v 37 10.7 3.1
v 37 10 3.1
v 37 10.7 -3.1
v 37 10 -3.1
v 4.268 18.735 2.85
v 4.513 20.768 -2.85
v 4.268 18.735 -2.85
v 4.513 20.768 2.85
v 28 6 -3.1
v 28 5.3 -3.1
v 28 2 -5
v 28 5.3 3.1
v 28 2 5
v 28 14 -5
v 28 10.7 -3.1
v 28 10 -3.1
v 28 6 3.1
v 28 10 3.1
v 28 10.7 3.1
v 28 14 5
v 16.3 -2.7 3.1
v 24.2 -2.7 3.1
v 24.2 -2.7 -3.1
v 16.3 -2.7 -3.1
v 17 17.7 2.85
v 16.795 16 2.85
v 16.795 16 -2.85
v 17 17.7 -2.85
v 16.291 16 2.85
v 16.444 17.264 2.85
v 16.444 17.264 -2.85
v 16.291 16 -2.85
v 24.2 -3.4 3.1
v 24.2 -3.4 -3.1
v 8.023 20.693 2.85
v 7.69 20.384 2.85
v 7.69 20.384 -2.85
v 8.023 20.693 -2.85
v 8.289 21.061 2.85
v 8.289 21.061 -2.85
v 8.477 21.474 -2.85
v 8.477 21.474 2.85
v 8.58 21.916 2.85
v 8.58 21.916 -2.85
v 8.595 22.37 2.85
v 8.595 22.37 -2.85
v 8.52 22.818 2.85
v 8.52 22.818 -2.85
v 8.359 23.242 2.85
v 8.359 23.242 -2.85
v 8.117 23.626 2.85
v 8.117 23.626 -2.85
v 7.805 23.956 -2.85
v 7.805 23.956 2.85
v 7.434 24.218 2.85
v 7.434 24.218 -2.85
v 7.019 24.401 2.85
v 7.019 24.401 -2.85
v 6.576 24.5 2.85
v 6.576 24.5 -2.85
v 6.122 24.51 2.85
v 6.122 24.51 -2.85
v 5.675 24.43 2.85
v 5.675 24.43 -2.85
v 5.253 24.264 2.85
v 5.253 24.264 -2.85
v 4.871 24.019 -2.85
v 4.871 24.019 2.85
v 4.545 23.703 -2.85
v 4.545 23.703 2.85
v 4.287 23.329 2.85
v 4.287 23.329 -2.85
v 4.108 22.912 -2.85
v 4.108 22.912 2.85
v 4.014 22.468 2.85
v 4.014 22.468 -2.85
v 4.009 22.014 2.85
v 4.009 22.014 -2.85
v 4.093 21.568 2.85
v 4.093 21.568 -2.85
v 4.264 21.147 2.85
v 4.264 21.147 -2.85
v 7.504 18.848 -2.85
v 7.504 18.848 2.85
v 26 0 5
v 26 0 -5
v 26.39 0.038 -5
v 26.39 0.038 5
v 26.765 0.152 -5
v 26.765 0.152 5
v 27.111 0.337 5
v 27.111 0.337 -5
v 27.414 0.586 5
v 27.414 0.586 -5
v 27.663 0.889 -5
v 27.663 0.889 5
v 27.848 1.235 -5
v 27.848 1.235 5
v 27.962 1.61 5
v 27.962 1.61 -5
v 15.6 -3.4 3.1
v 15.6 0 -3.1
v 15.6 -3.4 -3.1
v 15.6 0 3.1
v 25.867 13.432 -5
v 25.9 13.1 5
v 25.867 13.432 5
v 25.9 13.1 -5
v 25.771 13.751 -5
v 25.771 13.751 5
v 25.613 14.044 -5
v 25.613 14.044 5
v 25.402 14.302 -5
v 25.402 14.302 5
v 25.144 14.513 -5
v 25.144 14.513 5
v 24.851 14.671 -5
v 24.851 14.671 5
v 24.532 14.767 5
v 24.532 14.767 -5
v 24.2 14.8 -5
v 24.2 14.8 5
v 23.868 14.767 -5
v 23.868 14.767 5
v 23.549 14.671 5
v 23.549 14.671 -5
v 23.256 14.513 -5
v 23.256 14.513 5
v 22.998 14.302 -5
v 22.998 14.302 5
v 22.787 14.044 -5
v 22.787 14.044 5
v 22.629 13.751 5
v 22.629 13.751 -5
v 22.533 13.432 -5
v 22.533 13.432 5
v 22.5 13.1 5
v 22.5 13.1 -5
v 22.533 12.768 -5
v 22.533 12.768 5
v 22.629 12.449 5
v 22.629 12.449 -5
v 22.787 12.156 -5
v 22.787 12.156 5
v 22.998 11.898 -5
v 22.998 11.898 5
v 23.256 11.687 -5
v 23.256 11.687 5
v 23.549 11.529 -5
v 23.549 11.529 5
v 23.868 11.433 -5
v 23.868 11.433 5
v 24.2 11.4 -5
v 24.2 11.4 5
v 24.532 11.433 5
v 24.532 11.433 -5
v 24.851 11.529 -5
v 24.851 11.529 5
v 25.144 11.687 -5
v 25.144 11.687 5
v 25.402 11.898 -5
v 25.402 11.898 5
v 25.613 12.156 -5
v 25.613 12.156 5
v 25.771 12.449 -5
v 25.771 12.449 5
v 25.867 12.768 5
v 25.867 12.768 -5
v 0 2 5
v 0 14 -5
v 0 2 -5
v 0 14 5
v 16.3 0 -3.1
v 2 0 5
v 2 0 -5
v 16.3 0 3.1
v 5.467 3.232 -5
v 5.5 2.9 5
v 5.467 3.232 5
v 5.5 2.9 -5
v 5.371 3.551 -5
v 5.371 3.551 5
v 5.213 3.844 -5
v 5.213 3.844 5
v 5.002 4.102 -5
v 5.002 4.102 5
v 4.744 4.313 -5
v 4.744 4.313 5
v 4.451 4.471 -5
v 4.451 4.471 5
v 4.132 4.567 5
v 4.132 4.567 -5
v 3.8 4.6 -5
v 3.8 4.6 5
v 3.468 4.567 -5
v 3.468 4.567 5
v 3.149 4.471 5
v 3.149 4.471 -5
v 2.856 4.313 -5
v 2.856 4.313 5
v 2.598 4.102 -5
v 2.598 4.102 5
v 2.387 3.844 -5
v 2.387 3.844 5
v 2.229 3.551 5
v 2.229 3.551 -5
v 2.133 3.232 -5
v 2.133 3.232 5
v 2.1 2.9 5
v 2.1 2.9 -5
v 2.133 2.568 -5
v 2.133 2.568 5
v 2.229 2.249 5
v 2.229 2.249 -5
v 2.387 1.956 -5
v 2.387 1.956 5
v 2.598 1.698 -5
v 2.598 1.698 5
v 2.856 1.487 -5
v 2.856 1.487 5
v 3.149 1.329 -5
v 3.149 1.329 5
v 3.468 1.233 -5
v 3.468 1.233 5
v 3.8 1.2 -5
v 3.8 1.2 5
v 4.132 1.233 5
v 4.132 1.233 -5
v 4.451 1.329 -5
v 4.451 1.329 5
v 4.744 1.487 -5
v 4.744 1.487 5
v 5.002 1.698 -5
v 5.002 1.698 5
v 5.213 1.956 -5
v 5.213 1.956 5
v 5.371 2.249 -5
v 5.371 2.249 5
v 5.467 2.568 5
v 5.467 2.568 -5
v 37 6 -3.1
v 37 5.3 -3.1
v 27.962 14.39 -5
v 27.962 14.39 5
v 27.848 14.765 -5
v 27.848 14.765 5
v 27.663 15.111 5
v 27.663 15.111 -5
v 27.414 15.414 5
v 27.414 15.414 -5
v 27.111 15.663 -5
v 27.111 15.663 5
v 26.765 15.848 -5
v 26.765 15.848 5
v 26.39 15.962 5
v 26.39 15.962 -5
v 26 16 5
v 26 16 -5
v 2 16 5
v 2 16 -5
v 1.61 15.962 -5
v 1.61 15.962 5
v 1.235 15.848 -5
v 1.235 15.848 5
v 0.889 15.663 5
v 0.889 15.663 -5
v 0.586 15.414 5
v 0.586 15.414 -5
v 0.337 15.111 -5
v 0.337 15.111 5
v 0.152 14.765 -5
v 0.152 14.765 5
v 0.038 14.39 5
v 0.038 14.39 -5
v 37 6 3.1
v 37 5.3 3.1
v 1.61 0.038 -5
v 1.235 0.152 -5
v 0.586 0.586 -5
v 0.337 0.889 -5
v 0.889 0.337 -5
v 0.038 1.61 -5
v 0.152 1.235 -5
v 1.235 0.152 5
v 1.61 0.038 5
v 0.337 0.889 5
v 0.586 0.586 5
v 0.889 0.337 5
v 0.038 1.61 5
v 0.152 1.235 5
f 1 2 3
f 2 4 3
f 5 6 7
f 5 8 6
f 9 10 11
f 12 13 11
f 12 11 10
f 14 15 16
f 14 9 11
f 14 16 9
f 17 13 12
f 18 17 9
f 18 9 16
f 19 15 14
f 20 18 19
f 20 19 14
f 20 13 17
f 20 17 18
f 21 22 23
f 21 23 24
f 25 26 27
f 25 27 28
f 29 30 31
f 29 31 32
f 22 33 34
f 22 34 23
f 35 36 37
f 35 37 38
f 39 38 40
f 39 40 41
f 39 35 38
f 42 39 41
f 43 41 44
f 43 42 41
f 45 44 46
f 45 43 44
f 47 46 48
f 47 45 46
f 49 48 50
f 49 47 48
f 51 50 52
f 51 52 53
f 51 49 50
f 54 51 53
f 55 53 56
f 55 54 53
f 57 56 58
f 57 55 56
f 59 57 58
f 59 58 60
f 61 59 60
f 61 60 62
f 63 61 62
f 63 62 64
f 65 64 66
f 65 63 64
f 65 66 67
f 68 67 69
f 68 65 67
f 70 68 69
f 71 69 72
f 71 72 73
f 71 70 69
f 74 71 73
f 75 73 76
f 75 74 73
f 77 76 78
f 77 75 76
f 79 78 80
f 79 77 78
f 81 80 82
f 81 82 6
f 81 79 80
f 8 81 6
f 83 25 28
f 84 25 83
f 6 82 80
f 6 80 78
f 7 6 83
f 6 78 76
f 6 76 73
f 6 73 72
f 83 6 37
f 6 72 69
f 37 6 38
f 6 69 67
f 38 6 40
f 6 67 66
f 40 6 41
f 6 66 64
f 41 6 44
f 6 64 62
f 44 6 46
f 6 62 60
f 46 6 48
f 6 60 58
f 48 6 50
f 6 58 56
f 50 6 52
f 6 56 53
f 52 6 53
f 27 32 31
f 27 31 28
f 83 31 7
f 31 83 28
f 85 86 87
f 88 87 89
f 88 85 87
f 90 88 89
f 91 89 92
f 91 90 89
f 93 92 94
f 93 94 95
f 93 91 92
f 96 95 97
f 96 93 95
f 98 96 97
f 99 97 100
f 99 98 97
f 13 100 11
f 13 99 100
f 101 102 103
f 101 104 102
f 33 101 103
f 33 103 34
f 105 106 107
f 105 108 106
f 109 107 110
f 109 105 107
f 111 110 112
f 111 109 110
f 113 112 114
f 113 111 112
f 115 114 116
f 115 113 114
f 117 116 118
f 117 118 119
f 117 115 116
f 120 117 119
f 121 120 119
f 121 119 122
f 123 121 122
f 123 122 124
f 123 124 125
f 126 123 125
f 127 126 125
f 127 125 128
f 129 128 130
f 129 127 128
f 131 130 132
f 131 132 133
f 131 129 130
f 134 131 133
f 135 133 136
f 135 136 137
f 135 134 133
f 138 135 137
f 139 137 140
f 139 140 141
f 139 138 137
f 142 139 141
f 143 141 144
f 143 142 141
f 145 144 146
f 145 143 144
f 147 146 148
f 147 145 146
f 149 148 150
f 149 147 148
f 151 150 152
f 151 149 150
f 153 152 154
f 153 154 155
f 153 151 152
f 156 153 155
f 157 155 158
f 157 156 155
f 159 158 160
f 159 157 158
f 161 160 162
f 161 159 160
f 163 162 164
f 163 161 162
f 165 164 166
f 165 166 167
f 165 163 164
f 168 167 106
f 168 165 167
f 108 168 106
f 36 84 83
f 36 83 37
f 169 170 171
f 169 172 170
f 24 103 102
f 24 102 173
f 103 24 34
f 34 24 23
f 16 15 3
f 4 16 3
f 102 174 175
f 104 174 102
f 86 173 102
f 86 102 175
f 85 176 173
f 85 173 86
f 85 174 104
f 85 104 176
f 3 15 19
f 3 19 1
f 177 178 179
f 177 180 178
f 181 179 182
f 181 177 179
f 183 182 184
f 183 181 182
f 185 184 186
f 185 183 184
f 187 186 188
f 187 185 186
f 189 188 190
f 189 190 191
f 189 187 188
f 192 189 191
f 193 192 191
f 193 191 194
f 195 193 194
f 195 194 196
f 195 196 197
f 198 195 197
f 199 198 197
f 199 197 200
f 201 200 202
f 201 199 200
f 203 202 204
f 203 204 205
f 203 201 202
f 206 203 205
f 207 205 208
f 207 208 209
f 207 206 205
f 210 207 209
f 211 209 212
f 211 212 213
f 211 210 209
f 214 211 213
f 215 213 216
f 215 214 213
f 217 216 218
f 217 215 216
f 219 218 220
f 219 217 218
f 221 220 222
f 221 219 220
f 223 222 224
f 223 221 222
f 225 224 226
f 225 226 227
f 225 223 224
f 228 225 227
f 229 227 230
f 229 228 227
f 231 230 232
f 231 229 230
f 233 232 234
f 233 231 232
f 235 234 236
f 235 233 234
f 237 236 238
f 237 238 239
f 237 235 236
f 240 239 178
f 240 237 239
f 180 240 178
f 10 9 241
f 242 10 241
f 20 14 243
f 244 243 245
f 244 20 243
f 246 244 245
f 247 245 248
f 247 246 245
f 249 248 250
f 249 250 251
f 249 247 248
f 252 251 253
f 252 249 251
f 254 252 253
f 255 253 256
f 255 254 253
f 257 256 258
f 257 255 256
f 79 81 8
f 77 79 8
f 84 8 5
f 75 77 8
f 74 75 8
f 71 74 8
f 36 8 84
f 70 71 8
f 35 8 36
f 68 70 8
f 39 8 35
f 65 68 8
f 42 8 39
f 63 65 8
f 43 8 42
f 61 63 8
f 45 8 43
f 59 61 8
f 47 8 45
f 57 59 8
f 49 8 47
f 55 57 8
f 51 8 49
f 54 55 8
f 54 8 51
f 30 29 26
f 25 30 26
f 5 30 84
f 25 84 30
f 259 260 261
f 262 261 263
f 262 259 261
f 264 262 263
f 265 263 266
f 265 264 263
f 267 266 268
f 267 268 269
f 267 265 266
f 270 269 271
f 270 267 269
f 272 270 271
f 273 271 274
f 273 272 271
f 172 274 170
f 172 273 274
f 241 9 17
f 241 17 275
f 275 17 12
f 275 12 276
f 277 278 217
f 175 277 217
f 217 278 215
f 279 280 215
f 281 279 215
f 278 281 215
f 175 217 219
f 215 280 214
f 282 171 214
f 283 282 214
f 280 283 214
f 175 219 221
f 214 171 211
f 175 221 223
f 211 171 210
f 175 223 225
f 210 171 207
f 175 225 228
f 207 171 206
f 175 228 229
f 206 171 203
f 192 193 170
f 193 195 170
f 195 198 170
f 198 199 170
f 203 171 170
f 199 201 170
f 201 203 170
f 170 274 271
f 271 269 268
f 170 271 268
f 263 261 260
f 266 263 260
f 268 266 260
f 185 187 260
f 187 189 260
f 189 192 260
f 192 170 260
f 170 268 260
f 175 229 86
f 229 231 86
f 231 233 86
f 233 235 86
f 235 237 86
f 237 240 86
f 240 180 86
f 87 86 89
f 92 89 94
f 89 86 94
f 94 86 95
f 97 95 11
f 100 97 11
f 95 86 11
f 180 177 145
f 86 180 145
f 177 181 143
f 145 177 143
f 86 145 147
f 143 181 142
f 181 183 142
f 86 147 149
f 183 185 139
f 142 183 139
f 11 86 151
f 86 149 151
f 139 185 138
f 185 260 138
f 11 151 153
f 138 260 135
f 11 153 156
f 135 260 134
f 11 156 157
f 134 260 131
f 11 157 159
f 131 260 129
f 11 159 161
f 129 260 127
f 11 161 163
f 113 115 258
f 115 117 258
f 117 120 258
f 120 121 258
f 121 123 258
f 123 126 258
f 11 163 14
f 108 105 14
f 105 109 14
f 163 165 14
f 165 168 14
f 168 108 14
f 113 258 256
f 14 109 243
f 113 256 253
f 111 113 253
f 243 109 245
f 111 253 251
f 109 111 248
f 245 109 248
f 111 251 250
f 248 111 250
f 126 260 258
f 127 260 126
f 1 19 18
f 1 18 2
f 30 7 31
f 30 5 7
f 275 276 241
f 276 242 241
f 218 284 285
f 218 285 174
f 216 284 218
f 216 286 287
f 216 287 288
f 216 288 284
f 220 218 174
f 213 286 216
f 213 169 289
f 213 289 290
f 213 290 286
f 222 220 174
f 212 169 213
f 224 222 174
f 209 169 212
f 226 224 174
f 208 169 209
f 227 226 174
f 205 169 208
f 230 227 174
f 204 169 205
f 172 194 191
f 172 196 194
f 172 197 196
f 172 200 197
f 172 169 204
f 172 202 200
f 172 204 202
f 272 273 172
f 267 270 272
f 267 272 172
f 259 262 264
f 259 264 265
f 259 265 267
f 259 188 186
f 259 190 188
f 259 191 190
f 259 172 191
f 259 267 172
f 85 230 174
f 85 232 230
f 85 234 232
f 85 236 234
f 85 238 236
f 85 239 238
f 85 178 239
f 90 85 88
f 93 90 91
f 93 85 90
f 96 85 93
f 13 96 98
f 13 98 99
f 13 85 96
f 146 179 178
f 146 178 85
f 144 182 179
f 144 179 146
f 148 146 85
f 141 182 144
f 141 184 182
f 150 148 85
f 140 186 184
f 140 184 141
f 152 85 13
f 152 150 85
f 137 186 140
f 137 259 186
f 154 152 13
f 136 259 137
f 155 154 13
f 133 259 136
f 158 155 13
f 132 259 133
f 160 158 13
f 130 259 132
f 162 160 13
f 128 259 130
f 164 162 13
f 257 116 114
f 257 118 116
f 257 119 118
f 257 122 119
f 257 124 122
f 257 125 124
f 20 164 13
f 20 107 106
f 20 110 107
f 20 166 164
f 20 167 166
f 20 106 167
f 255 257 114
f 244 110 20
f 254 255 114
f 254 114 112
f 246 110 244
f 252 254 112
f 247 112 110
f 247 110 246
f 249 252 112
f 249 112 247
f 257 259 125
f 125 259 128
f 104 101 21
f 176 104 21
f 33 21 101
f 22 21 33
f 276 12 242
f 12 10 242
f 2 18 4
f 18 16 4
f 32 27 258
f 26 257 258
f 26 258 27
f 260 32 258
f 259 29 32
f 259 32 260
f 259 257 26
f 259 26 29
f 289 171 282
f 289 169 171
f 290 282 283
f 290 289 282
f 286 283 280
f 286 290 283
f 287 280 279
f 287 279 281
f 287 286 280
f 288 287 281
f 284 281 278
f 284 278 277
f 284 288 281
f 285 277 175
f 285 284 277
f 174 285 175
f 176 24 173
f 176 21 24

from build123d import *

# Parameters (mm, degrees)
SKETCH1_R           = 1.7
BOSS_EXTRUDE1_DEPTH = 5
SKETCH2_R           = 2.3
BOSS_EXTRUDE2_DEPTH = 2.85
SKETCH3_W           = 9
SKETCH3_H           = 0.7
BOSS_EXTRUDE3_DEPTH = 3.1


with BuildPart() as part:
    # Sketch1 → Boss-Extrude1 (new body, symmetric)
    with BuildSketch(Plane.XY):
        with BuildLine():
            Line((2, 0), (26, 0))
            ThreePointArc((26, 0), (27.414213562, 0.585786438), (28, 2))
            Line((28, 2), (28, 14))
            ThreePointArc((28, 14), (27.414213562, 15.414213562), (26, 16))
            Line((26, 16), (2, 16))
            ThreePointArc((2, 16), (0.585786438, 15.414213562), (0, 14))
            Line((0, 14), (0, 2))
            ThreePointArc((0, 2), (0.585786438, 0.585786438), (2, 0))
        make_face()
        with Locations((3.8, 2.9)):
            Circle(SKETCH1_R, mode=Mode.SUBTRACT)
        with Locations((24.2, 13.1)):
            Circle(SKETCH1_R, mode=Mode.SUBTRACT)
    extrude(amount=BOSS_EXTRUDE1_DEPTH, both=True)

    # Sketch2 → Boss-Extrude2 (add, symmetric)
    with BuildSketch(Plane.XY):
        with BuildLine():
            Line((16.443613757, 17.263612158), (15.919001734, 12.923377494))
            Line((15.919001734, 12.923377494), (16.415388776, 12.863378293))
            Line((16.415388776, 12.863378293), (17, 17.7))
            Line((17, 17.7), (7.504443651, 18.847745091))
            Line((7.504443651, 18.847745091), (7.690168637, 20.384290169))
            ThreePointArc((7.690168637, 20.384290169), (6.024003677, 19.933239209), (4.513291566, 20.768285054))
            Line((4.513291566, 20.768285054), (4.267567379, 18.735352933))
            Line((4.267567379, 18.735352933), (16.443613757, 17.263612158))
        make_face()
        with Locations((6.3, 22.216619605)):
            Circle(SKETCH2_R)
    extrude(amount=BOSS_EXTRUDE2_DEPTH, both=True)

    # Sketch3 → Boss-Extrude3 (add, symmetric)
    with BuildSketch(Plane.XY):
        with Locations((32.5, 10.35)):
            Rectangle(SKETCH3_W, SKETCH3_H)
        with Locations((32.5, 5.65)):
            Rectangle(SKETCH3_W, SKETCH3_H)
        Polygon((15.6, 0), (15.6, -3.4), (24.2, -3.4), (24.2, -2.7), (16.3, -2.7), (16.3, 0), align=None)
    extrude(amount=BOSS_EXTRUDE3_DEPTH, both=True)


solid = part.part
